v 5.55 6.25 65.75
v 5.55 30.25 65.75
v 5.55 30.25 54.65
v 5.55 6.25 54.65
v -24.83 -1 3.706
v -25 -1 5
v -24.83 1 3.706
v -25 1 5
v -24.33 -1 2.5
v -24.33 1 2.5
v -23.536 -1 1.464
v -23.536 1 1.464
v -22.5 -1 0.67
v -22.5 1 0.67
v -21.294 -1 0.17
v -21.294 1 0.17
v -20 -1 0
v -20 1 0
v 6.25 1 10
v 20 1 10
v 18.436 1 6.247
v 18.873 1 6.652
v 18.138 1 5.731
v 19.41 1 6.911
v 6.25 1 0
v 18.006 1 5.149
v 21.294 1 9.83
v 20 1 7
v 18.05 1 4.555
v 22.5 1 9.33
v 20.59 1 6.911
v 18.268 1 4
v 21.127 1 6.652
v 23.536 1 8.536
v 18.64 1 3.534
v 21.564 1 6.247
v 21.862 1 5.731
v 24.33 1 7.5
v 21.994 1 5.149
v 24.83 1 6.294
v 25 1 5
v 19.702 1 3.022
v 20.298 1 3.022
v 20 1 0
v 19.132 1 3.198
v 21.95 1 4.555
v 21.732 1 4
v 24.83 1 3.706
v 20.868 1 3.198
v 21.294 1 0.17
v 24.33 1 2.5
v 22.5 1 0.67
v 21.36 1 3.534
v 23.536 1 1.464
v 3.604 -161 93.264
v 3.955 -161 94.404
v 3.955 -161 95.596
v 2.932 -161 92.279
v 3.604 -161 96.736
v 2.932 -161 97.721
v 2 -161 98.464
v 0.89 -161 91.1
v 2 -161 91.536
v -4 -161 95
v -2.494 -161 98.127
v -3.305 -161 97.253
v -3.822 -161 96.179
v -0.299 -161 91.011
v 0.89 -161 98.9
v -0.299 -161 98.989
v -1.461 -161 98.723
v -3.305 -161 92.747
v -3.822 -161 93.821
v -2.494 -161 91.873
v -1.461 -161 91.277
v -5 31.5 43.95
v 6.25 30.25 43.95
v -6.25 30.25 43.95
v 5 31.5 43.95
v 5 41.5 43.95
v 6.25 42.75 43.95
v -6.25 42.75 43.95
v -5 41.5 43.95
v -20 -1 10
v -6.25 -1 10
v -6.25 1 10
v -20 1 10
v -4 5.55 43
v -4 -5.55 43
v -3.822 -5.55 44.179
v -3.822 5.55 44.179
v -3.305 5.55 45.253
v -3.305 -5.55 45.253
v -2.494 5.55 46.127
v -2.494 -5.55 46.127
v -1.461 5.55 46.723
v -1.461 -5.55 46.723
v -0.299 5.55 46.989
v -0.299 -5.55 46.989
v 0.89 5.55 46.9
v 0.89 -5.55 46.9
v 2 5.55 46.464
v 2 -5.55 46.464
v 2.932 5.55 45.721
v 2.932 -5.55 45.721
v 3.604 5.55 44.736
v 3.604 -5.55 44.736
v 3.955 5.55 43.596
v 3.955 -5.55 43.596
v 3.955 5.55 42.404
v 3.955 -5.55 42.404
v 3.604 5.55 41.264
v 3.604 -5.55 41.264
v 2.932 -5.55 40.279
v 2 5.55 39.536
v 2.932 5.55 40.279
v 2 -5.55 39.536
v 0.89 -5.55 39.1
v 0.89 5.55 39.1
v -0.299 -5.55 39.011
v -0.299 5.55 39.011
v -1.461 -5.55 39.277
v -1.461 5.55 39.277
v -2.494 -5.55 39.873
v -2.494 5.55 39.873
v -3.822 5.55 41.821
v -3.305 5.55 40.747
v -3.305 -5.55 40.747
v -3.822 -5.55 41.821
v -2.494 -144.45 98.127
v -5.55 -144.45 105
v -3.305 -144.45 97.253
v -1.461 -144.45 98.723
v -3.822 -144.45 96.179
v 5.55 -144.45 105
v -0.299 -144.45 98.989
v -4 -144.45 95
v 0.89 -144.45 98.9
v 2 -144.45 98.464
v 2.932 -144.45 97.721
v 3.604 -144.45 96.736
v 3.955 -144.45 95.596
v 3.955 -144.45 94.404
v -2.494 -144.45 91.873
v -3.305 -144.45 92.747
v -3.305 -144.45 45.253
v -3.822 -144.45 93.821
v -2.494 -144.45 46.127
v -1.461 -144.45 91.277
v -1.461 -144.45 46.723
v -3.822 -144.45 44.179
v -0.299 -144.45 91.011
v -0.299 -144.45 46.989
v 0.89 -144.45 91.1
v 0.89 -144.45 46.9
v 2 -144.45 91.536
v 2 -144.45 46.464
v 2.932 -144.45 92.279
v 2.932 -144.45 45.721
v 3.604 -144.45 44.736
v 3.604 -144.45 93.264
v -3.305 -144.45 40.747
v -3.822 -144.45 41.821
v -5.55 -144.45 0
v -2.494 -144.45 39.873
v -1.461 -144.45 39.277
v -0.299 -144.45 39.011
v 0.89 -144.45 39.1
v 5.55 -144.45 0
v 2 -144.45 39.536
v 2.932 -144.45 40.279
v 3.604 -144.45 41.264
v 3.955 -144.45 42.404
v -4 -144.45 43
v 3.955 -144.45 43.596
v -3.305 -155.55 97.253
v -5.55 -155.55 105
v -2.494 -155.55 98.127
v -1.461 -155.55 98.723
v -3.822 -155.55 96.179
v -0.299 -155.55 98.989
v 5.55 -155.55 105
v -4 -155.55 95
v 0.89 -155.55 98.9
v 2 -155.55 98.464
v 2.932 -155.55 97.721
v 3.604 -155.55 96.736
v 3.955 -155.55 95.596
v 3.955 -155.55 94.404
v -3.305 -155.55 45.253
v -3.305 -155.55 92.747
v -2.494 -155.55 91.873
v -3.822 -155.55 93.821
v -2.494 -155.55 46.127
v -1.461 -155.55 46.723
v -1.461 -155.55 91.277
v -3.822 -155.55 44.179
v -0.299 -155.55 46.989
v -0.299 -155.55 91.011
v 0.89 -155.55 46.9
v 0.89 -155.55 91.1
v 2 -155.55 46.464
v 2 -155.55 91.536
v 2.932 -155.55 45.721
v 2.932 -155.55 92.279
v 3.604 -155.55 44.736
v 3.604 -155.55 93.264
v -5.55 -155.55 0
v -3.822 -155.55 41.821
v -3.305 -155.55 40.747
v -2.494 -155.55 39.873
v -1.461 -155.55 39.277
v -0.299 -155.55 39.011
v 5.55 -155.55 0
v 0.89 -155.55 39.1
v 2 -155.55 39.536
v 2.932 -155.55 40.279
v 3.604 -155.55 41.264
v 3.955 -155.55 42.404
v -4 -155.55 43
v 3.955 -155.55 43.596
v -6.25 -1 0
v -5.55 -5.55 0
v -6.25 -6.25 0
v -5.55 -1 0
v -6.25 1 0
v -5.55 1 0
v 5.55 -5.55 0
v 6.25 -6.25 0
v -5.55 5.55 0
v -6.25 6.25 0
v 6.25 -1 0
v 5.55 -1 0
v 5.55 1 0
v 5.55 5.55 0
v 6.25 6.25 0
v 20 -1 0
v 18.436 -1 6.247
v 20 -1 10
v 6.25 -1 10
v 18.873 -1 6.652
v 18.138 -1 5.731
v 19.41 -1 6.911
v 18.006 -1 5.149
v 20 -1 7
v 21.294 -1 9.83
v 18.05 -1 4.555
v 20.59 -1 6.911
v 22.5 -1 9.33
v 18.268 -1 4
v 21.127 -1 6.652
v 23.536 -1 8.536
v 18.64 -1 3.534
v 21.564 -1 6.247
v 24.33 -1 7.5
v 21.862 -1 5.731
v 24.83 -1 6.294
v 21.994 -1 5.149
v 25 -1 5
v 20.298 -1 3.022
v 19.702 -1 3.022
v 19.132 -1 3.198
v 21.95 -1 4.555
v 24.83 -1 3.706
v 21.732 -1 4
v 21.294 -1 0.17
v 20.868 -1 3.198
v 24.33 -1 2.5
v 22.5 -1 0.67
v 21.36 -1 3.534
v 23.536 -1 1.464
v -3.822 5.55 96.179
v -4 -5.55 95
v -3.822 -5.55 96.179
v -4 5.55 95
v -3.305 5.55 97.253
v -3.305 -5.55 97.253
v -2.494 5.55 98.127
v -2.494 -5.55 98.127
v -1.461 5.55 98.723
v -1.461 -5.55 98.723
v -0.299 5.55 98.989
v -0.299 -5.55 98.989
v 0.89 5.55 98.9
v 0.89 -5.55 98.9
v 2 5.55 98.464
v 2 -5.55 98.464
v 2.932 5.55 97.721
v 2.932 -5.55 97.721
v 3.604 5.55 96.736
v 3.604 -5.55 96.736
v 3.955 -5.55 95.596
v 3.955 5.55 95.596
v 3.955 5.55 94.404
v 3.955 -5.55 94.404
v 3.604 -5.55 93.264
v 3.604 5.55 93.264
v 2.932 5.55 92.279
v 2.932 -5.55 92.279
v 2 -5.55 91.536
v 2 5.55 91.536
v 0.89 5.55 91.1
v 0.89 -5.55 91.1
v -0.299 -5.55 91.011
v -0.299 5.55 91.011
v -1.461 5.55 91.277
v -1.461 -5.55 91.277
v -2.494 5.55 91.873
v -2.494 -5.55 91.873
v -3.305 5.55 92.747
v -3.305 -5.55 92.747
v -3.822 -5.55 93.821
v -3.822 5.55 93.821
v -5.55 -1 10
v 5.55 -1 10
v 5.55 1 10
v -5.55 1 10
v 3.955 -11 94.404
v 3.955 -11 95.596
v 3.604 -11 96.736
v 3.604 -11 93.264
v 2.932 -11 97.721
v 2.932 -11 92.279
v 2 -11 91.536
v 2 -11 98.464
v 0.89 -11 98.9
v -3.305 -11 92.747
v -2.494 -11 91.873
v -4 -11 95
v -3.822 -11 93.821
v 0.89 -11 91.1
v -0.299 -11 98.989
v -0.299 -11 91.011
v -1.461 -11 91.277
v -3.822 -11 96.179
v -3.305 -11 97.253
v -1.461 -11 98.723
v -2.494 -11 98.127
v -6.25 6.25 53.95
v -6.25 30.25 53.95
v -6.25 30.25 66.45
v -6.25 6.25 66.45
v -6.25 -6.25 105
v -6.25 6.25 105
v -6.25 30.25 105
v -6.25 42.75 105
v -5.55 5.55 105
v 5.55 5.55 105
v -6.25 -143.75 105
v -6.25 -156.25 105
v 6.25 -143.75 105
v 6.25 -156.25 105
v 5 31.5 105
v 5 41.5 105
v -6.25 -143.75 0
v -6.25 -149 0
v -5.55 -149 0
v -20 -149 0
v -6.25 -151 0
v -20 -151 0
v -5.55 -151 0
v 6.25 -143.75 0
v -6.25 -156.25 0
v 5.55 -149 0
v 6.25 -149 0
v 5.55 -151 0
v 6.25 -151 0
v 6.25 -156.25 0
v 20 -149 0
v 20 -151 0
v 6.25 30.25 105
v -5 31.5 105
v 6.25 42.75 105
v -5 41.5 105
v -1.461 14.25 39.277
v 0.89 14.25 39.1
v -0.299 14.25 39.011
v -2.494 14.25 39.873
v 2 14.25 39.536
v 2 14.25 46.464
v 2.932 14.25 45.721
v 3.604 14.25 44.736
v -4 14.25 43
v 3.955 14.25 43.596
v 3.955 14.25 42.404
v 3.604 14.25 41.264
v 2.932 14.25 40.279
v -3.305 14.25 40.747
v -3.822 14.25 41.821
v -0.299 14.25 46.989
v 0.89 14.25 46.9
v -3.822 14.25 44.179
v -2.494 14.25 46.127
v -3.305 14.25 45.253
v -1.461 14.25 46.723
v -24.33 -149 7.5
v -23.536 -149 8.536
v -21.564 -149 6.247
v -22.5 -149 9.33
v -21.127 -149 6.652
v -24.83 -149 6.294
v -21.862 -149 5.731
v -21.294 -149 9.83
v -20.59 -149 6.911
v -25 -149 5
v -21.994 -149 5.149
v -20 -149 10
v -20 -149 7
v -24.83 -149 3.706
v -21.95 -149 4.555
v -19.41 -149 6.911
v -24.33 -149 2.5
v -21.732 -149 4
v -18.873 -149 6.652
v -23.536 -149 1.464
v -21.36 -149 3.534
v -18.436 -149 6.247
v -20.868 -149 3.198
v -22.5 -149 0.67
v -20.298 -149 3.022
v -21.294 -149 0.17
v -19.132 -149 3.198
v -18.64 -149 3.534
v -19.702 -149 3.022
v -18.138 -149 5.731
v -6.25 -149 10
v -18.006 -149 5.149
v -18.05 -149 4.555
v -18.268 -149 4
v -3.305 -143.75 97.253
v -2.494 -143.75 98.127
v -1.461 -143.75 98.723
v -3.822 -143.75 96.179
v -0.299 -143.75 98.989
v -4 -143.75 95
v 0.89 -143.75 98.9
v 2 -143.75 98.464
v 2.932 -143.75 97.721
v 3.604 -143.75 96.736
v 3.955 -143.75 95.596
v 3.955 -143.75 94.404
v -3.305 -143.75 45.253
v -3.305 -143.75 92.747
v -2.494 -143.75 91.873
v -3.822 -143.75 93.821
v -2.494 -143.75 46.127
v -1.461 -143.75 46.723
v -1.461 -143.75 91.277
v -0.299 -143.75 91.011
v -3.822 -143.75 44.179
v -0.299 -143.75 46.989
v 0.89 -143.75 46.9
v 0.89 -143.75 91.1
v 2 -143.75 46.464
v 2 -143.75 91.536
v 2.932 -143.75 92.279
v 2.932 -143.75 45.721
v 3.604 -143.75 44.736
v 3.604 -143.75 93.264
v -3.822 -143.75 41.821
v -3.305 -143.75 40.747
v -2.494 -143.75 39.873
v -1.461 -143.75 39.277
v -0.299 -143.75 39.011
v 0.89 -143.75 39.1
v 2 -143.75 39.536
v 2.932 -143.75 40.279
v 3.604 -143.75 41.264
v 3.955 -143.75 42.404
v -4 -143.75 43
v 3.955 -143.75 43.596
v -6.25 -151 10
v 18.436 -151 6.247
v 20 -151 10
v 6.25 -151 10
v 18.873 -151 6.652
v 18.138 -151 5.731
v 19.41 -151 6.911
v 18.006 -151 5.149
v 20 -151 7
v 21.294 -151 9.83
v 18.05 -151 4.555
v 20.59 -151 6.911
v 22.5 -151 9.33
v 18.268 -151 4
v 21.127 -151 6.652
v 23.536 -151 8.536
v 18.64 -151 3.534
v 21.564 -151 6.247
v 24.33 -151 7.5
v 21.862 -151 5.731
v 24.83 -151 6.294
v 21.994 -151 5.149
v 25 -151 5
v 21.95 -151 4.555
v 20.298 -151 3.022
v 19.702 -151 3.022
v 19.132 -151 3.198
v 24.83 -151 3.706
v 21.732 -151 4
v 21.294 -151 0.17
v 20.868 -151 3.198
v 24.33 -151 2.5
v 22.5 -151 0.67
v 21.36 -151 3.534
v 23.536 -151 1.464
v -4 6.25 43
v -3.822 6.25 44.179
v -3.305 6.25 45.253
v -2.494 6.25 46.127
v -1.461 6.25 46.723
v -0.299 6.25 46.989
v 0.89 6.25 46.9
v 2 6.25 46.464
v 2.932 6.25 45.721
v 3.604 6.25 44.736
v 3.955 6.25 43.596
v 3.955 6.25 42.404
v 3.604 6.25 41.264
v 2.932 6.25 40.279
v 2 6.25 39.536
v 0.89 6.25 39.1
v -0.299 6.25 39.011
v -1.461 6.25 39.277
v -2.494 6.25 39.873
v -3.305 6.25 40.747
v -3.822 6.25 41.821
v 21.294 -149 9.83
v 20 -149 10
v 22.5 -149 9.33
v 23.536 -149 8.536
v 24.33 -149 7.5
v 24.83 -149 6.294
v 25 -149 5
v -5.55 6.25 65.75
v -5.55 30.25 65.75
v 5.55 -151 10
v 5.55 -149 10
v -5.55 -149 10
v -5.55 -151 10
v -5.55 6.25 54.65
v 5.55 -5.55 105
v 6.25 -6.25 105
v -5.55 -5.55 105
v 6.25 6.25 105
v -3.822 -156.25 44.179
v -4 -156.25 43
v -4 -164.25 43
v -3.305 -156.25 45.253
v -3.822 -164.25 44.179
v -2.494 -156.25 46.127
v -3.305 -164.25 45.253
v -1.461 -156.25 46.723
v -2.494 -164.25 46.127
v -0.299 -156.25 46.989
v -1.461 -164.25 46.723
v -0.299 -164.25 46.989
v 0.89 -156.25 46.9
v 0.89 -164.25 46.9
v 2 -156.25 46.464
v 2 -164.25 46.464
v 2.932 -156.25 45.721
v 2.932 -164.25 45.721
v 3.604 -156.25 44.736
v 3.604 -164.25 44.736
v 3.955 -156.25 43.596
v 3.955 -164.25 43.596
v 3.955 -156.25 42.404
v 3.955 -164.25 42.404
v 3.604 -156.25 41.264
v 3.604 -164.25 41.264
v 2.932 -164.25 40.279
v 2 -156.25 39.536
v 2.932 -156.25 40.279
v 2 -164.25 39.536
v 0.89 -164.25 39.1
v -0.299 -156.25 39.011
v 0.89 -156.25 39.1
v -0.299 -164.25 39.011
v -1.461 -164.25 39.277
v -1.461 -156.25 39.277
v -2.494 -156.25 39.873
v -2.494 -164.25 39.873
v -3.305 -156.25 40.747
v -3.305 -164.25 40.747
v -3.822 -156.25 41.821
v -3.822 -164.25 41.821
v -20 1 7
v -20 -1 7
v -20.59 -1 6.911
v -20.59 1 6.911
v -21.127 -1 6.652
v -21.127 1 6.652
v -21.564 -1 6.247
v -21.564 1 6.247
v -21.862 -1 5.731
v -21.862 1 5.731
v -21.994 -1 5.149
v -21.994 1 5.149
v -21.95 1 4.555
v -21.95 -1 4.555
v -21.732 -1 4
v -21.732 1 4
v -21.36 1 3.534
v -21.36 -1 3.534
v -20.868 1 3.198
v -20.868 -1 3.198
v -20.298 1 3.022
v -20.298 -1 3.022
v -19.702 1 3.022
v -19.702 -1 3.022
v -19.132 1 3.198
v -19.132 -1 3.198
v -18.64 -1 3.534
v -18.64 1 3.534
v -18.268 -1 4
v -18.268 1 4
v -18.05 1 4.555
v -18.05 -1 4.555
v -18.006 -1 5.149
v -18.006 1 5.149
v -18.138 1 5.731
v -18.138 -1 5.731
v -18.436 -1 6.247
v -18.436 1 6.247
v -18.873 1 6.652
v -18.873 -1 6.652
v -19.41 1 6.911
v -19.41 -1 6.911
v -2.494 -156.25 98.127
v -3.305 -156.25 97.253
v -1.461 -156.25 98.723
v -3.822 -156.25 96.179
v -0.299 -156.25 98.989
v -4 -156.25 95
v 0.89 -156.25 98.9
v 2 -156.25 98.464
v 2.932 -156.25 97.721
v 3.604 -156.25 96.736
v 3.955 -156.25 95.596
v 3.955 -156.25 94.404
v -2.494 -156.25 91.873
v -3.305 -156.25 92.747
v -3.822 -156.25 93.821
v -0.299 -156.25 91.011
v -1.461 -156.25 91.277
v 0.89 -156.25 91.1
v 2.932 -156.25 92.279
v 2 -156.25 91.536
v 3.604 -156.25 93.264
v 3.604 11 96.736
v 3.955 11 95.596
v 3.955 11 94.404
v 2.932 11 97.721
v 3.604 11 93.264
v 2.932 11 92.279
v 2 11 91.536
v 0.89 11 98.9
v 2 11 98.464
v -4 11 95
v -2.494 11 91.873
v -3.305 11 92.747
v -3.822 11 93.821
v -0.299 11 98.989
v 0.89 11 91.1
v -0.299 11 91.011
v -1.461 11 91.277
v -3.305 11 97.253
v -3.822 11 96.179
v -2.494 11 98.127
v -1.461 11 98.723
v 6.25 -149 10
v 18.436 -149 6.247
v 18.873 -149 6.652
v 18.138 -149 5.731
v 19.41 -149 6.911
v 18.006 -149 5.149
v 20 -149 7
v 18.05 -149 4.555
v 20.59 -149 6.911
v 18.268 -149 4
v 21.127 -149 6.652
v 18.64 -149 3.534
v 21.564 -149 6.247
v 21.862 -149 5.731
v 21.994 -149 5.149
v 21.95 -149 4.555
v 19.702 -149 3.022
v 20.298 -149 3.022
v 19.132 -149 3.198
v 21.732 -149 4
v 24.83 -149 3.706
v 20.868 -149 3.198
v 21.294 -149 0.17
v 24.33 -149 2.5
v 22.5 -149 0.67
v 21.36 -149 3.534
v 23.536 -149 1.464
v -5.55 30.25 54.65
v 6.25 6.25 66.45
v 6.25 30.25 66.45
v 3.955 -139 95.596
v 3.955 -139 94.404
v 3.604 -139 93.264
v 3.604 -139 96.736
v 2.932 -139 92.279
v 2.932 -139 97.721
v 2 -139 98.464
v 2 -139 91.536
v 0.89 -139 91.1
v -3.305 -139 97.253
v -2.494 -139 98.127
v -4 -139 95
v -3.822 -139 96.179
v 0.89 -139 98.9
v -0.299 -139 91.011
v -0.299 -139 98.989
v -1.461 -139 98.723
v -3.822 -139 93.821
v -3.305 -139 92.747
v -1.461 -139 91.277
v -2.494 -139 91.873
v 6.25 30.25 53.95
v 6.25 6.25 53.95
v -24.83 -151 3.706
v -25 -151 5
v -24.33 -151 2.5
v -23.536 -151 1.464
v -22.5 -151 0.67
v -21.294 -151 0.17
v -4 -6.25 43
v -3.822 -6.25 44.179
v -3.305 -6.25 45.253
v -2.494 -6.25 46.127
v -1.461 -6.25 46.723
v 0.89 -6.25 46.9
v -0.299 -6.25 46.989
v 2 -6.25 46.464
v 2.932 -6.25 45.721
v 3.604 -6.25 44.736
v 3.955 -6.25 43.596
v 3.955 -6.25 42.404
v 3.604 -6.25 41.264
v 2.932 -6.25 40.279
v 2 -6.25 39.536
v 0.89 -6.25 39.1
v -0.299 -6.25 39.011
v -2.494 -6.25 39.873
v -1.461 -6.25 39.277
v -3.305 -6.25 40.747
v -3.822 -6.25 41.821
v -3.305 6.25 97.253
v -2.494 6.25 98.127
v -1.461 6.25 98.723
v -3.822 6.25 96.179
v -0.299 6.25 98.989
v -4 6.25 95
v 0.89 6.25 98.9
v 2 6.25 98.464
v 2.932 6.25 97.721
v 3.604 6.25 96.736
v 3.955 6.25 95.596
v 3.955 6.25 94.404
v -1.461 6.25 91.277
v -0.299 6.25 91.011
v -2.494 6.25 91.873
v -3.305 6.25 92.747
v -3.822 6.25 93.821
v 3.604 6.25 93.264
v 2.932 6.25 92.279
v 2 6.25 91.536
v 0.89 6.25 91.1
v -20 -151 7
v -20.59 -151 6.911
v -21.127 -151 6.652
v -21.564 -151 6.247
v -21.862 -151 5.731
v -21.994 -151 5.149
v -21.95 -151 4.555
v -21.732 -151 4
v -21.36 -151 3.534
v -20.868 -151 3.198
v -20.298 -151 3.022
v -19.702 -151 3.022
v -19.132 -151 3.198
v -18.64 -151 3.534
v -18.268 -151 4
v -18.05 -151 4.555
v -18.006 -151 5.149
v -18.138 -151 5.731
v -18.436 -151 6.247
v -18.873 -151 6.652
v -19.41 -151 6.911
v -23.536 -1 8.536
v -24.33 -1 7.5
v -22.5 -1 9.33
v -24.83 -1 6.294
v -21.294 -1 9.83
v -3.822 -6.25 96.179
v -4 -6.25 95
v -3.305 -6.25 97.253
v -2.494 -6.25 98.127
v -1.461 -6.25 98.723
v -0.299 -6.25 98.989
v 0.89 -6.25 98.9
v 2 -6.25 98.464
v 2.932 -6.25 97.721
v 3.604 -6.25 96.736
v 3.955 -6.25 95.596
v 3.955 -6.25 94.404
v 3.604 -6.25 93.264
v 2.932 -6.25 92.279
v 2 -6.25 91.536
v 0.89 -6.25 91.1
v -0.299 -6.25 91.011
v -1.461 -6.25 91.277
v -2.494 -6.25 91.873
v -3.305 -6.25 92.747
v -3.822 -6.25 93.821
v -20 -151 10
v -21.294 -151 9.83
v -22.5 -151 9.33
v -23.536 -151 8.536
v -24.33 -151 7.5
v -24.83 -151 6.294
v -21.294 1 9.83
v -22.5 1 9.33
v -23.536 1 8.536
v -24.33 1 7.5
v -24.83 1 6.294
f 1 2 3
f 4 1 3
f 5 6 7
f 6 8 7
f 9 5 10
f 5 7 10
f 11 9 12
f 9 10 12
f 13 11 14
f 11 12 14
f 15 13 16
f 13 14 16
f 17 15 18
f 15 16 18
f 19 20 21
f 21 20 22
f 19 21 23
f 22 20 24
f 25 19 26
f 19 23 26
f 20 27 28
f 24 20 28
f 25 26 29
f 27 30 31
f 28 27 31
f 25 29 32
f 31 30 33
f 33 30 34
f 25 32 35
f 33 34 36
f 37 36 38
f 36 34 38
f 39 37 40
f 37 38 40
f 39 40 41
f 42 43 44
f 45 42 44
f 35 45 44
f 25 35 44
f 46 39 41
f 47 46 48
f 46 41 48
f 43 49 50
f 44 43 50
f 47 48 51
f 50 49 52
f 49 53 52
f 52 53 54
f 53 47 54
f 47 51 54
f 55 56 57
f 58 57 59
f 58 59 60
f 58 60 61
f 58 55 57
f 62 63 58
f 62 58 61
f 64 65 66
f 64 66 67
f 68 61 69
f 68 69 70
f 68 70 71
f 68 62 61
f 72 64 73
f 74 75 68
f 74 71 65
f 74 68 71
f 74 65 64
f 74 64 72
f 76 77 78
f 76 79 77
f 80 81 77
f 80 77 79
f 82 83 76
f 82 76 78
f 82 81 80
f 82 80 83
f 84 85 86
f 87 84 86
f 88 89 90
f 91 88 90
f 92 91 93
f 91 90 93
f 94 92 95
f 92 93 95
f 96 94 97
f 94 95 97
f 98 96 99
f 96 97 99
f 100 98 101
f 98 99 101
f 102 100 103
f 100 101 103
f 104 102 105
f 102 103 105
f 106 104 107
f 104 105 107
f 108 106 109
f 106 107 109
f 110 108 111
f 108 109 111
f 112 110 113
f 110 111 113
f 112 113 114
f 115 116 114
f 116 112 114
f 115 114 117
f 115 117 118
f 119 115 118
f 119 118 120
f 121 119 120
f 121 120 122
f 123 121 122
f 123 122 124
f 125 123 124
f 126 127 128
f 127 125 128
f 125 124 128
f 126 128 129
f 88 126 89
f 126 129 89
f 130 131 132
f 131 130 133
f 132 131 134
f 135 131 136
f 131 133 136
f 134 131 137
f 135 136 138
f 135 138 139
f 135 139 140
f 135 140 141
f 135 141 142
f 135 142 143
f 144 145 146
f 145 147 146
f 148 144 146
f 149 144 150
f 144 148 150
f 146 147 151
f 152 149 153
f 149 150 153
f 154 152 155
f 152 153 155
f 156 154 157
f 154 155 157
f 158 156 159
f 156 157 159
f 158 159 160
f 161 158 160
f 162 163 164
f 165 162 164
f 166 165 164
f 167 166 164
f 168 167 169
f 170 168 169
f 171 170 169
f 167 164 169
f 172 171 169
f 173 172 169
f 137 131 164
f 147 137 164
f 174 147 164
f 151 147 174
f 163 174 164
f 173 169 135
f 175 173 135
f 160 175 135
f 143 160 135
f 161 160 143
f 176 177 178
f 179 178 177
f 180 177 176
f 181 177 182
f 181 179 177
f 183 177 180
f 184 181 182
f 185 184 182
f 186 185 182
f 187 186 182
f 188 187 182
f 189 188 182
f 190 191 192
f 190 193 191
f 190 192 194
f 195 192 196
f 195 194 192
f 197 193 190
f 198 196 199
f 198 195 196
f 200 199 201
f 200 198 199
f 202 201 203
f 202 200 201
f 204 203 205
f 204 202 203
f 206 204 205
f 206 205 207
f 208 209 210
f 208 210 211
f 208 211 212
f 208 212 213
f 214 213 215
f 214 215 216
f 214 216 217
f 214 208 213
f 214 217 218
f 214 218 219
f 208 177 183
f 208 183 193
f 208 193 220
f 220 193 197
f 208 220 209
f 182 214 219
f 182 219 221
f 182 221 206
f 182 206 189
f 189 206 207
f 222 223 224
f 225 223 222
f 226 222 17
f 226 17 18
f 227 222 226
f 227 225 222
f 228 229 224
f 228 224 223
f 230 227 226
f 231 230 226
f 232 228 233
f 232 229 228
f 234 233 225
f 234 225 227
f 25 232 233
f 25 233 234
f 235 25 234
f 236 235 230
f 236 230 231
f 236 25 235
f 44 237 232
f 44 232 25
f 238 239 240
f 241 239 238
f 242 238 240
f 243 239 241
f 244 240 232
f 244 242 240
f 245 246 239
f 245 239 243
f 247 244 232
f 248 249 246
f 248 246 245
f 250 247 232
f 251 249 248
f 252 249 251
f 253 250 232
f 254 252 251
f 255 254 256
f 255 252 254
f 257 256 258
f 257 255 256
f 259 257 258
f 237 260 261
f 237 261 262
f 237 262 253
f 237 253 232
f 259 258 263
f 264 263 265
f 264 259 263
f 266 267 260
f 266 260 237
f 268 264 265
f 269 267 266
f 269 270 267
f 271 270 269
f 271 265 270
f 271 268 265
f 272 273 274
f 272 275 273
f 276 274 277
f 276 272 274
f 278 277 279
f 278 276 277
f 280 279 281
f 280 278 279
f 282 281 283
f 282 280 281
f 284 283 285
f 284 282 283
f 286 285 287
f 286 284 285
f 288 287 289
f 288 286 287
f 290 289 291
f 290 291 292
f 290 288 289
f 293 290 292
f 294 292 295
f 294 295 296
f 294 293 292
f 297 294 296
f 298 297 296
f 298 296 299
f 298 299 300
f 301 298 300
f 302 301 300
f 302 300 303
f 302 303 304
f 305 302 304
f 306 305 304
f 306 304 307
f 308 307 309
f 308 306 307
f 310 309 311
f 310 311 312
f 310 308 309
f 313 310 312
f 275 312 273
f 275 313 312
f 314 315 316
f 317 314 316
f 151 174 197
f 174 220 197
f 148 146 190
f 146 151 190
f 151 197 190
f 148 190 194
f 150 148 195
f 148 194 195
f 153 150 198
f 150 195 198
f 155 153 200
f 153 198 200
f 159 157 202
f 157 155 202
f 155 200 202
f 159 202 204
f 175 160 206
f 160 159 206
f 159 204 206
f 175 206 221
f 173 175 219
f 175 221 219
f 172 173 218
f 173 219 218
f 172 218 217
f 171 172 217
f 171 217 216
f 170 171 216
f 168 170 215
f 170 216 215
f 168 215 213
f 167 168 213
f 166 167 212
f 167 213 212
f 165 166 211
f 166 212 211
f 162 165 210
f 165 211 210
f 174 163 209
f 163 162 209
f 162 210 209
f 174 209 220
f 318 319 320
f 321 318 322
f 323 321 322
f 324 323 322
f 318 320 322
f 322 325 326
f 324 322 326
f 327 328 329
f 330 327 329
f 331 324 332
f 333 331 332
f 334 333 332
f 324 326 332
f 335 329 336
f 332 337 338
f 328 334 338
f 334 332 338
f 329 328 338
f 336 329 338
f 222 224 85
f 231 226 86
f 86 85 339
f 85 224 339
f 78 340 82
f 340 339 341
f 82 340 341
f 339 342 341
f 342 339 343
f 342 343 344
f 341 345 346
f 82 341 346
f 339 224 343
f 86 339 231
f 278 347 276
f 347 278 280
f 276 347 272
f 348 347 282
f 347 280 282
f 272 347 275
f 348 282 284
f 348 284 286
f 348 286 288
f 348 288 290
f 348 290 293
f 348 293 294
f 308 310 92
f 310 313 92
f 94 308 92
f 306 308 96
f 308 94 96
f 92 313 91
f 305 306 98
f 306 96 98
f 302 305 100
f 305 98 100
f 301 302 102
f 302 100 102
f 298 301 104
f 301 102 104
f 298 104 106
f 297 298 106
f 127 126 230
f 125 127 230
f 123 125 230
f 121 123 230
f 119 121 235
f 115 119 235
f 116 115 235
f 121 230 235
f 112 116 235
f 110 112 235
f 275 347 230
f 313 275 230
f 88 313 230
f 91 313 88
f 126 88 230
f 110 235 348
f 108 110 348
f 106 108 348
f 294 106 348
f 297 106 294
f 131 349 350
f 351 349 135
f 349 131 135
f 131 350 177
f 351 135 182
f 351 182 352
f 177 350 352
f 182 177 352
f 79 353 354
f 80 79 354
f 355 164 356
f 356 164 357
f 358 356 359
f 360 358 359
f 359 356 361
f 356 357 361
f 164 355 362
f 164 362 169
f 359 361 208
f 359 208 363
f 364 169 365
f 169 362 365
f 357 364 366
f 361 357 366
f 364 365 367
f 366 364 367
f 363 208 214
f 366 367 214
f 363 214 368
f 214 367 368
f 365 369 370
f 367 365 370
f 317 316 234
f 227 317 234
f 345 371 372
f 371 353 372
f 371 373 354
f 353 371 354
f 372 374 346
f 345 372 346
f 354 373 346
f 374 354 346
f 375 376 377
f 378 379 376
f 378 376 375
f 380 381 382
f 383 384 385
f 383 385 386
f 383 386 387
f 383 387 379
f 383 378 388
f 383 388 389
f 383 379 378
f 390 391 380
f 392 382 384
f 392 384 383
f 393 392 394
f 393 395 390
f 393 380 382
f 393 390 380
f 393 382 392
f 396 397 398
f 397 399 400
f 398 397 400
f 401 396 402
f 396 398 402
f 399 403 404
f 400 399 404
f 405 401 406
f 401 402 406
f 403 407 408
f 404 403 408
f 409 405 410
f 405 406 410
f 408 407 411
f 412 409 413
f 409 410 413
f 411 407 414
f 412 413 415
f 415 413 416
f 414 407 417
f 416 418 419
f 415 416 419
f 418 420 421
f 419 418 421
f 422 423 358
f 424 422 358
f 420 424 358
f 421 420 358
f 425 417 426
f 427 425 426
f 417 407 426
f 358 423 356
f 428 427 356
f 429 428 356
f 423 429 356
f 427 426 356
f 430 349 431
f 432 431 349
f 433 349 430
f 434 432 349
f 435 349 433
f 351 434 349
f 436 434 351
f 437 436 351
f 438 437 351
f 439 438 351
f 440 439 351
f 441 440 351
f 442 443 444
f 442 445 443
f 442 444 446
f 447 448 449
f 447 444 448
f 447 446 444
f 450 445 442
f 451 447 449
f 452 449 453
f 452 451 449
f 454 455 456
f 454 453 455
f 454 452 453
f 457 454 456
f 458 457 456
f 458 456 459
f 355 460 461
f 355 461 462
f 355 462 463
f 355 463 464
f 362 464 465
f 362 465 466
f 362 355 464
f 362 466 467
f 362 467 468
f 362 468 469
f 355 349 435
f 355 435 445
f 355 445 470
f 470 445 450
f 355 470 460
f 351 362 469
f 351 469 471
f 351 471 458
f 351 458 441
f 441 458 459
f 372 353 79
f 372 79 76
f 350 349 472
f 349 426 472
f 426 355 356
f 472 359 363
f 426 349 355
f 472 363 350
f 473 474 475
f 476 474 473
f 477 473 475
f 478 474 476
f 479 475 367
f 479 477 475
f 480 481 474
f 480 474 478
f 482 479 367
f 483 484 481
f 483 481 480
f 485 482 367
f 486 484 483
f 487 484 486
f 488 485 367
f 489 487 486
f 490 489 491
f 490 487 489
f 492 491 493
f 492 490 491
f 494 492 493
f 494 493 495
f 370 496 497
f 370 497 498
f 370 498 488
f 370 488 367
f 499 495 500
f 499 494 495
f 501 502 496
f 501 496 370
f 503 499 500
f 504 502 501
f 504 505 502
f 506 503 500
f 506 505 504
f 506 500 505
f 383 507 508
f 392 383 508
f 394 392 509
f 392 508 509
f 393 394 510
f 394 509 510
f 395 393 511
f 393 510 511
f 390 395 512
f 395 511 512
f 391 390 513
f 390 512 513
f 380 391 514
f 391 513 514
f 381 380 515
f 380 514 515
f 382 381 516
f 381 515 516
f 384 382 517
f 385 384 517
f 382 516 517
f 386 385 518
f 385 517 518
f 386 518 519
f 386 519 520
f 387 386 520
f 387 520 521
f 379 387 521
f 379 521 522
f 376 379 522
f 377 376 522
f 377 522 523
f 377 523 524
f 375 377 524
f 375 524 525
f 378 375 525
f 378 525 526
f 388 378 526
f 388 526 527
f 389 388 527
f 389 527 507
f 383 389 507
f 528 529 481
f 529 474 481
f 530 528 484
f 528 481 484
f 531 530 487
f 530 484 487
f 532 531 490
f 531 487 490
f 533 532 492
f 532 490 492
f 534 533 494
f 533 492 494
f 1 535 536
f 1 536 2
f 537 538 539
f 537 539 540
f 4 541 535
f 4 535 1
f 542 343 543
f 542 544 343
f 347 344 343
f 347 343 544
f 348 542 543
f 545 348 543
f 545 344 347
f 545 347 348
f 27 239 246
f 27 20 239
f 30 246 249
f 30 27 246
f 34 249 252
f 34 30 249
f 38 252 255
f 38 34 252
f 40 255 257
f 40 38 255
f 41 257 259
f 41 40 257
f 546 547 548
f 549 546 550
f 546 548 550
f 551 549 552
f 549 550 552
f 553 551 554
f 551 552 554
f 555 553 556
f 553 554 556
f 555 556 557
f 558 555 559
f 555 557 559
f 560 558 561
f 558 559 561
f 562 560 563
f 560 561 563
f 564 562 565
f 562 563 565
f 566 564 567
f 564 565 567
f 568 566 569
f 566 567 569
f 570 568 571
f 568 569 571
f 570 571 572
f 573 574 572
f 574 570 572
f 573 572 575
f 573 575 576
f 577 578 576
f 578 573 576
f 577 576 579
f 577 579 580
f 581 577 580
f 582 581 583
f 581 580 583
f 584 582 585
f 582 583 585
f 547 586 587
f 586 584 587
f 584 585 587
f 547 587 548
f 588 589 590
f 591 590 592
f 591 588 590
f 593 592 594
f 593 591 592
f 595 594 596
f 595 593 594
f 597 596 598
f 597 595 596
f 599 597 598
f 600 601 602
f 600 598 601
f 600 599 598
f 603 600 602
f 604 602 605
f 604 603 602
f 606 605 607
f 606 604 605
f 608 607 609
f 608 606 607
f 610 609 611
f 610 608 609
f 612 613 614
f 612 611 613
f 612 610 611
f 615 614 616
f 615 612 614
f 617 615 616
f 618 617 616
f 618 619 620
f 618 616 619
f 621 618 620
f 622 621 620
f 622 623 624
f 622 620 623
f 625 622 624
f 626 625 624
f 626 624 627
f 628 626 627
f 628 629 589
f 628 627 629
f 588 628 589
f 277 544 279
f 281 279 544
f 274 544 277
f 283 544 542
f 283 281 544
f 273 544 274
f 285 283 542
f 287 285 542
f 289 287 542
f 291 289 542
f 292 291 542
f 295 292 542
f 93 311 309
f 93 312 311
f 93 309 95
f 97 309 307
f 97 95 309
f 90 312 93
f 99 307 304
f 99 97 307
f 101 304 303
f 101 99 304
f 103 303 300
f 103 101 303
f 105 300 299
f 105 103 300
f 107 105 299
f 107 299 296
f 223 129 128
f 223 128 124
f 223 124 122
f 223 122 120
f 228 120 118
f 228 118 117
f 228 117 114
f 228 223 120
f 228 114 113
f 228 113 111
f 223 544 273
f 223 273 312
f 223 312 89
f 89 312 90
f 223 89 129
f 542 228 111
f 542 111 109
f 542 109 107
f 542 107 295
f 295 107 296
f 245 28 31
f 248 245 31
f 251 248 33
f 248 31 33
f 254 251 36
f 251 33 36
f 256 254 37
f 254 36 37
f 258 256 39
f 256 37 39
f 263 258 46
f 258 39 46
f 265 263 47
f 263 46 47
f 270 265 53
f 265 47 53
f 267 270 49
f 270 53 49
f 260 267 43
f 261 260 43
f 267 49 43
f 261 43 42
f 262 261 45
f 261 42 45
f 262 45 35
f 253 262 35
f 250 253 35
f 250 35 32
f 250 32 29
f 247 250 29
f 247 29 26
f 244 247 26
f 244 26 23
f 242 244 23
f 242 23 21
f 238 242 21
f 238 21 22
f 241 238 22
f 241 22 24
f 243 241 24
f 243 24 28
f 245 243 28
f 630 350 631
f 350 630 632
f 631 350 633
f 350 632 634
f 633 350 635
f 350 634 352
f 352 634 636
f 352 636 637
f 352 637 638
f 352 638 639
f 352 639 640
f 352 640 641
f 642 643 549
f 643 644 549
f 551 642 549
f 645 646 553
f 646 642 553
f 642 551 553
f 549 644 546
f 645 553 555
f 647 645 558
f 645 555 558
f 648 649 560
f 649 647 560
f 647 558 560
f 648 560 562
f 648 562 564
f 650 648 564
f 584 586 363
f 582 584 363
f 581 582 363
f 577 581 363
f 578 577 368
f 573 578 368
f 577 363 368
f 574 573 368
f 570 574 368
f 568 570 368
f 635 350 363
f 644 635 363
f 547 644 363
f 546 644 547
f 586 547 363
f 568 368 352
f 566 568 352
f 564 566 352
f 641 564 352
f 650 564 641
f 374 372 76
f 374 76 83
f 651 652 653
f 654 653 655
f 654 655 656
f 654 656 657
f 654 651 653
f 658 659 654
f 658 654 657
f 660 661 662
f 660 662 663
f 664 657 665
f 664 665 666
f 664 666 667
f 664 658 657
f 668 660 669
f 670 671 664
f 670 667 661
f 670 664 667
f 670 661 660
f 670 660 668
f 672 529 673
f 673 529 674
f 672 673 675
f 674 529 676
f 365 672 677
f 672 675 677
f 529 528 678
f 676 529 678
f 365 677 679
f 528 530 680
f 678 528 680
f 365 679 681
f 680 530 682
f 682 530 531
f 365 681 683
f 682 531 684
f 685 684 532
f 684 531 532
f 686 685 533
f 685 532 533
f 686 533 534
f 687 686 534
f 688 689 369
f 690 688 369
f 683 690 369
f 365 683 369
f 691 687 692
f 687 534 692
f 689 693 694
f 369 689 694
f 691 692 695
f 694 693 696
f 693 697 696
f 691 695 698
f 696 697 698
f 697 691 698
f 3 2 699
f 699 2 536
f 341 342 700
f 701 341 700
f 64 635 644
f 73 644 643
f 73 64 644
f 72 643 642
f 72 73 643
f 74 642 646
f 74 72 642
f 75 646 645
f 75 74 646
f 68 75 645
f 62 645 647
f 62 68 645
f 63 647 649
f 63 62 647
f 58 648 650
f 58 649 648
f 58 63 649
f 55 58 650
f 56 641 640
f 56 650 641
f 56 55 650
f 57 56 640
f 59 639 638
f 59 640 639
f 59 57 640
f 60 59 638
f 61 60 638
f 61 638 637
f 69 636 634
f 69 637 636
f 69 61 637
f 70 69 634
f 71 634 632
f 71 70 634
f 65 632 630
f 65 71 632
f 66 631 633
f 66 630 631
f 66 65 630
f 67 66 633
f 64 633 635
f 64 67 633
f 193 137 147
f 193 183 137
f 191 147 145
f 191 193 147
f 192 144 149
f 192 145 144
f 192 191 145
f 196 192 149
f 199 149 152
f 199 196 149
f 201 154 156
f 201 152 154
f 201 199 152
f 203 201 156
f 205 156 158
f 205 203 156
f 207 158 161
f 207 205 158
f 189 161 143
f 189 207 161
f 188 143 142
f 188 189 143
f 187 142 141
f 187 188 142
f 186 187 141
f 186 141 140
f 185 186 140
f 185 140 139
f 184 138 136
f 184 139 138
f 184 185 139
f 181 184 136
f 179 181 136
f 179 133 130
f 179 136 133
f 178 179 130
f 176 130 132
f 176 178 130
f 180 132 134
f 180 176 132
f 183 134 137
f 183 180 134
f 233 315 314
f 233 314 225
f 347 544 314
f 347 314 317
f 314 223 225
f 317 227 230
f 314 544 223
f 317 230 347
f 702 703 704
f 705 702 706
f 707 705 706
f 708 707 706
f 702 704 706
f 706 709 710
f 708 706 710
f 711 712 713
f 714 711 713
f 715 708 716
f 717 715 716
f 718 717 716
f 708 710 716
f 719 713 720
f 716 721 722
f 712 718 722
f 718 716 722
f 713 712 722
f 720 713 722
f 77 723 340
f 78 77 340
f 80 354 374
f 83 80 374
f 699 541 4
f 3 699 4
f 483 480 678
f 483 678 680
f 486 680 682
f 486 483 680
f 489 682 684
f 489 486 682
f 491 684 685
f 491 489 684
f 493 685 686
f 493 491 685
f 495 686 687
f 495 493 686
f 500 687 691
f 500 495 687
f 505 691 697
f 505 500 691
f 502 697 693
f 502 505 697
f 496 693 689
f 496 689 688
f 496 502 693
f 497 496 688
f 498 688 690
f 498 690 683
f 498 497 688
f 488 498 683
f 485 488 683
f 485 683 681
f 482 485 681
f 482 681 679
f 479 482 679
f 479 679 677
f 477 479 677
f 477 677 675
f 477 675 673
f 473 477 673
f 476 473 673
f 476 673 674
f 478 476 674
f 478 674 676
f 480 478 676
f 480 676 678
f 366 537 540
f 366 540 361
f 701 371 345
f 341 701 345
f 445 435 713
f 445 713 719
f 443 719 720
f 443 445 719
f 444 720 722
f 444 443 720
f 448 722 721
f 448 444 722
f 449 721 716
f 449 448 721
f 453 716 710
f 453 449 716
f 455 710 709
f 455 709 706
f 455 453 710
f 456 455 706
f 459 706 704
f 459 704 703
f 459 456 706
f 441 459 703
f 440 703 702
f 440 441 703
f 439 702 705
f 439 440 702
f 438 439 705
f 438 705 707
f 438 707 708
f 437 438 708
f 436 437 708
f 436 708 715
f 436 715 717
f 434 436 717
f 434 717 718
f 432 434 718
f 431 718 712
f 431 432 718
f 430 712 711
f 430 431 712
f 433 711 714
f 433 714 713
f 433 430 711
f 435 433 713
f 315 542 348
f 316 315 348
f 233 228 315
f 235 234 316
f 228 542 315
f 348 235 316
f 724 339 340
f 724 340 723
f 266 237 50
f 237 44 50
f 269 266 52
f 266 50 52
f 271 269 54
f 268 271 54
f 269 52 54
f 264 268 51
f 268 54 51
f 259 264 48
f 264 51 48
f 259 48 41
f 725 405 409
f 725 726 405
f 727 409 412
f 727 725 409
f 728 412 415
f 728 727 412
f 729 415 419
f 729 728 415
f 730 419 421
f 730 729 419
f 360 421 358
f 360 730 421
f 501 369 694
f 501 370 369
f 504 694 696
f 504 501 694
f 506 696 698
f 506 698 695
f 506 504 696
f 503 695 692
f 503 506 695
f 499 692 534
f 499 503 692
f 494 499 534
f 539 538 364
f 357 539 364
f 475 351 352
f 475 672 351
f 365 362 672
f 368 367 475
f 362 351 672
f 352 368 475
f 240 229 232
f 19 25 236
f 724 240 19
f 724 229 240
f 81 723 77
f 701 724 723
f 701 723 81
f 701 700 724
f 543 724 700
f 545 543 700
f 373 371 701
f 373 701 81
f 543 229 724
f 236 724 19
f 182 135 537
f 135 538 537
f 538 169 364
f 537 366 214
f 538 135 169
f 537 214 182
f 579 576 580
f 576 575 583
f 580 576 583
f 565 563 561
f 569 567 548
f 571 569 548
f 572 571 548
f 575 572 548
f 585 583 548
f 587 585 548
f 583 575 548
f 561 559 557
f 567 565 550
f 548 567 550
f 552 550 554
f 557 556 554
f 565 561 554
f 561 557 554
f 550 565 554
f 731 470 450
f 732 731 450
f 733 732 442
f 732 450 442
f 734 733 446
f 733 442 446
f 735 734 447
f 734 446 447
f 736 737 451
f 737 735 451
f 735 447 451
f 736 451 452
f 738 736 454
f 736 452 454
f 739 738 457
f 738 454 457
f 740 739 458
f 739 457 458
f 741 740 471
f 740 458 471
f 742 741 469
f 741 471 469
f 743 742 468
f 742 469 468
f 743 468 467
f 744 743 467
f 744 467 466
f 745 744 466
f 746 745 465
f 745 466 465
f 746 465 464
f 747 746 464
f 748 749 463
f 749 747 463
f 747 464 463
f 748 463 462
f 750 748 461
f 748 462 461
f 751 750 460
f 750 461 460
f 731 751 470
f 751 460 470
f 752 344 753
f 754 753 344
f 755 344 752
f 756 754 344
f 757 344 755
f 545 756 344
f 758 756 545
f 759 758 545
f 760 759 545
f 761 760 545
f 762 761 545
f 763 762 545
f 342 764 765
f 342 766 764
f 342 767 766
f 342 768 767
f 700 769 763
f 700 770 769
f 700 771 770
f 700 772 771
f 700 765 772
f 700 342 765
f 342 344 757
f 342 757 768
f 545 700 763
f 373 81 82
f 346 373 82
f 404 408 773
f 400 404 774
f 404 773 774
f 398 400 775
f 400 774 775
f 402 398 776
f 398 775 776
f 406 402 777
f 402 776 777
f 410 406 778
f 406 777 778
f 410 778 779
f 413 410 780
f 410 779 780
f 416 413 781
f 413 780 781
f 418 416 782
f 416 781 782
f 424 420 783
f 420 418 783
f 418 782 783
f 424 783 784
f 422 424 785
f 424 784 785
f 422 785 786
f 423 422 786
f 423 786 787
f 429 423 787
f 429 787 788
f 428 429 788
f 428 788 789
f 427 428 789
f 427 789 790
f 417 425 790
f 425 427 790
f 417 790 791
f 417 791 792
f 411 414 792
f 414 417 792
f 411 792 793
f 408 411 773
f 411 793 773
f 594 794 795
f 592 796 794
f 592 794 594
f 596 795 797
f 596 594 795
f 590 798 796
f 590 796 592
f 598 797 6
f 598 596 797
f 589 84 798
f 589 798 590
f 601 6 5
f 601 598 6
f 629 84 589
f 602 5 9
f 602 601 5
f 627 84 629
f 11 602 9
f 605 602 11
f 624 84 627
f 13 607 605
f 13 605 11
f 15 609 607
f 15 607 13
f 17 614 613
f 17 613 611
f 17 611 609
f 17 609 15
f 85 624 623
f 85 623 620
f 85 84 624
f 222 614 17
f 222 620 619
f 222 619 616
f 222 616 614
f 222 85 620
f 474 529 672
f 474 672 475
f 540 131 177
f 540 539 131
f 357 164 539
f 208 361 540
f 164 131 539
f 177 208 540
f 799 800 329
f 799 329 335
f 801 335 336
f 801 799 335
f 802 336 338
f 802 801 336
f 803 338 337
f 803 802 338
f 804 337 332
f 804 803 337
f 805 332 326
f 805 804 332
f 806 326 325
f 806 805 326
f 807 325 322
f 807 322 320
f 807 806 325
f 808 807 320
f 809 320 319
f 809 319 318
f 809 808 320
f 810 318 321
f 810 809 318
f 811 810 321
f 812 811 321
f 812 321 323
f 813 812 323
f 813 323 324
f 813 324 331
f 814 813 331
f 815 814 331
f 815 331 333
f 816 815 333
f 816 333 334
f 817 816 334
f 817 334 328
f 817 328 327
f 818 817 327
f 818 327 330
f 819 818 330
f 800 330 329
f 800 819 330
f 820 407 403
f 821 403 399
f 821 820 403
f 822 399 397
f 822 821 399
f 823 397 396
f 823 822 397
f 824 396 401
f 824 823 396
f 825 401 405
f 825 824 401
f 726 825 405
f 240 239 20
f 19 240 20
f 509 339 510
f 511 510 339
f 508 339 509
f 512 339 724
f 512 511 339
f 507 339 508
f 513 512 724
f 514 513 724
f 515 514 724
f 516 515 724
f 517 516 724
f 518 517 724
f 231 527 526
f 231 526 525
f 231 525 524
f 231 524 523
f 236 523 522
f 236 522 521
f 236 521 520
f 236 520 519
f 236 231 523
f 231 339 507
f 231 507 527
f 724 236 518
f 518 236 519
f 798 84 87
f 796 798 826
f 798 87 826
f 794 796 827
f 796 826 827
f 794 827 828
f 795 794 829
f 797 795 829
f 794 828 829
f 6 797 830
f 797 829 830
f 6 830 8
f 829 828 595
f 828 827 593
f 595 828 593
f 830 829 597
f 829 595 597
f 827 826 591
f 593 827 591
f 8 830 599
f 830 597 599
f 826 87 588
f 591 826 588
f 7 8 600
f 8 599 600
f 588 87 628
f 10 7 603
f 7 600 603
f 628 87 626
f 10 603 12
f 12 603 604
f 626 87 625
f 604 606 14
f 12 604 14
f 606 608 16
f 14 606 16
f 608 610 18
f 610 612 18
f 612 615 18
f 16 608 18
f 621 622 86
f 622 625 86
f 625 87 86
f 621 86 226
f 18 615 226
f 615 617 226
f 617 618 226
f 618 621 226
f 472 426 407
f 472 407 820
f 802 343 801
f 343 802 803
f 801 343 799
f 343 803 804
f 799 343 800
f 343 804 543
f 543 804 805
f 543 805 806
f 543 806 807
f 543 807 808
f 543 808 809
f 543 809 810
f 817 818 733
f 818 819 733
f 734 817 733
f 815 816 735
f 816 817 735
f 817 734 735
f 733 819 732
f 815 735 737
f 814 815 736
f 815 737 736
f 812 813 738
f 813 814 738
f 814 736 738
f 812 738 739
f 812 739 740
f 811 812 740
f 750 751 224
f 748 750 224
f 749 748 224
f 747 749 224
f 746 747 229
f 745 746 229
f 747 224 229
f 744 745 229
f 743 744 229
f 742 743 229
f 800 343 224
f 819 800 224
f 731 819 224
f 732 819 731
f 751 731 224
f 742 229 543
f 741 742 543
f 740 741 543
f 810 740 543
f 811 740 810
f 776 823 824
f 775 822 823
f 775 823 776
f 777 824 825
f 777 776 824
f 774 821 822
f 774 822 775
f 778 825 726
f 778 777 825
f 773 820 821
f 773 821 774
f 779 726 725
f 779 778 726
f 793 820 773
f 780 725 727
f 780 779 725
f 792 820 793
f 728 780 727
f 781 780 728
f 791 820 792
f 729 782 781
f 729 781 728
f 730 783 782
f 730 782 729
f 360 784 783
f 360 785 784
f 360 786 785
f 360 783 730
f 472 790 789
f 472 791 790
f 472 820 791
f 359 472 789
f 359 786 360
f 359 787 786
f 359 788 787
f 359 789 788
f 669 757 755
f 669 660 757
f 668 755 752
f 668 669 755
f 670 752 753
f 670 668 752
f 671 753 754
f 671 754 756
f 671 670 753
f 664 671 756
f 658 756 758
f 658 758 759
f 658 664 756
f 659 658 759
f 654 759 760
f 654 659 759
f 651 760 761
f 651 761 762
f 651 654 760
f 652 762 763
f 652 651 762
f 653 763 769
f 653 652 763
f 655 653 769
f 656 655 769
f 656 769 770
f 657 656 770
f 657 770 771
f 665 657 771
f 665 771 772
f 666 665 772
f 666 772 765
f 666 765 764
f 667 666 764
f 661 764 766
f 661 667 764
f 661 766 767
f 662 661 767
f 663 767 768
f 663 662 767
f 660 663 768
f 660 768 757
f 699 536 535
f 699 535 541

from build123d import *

# Parameters (mm, degrees)
SKETCH2_W                = 12.5
SKETCH2_H                = 12.5
SKETCH2_W_2              = 11.1
SKETCH2_H_2              = 11.1
BOSS_EXTRUDE1_DEPTH      = 105
SKETCH3_R                = 4
CUT_EXTRUDE1_DEPTH       = 105
SKETCH4_W                = 10
SKETCH4_H                = 2
BOSS_EXTRUDE2_DEPTH      = 25
FILLET1_R                = 5
SKETCH5_R                = 2
CUT_EXTRUDE2_DEPTH       = 40
BOSS_EXTRUDE3_START      = -82.5
SKETCH6_R                = 4
BOSS_EXTRUDE3_DEPTH      = 90.5
SKETCH8_W                = 12.5
SKETCH8_H                = 12.5
SKETCH8_W_2              = 11.1
SKETCH8_H_2              = 11.1
BOSS_EXTRUDE4_DEPTH      = 24
BOSS_EXTRUDE5_DEPTH      = 10
BOSS_EXTRUDE5_DEPTH_BACK = 51.049582
SKETCH9_W                = 12.5
SKETCH9_H                = 12.5
SKETCH9_W_2              = 10
SKETCH9_H_2              = 10
SKETCH11_R               = 4
BOSS_EXTRUDE6_DEPTH      = 11
SKETCH12_R               = 4
BOSS_EXTRUDE7_DEPTH      = 11


with BuildPart() as part:
    # Sketch2 → Boss-Extrude1 (new body)
    with BuildSketch(Plane.XY):
        Rectangle(SKETCH2_W, SKETCH2_H)
        Rectangle(SKETCH2_W_2, SKETCH2_H_2, mode=Mode.SUBTRACT)
    extrude(amount=BOSS_EXTRUDE1_DEPTH)

    # Sketch3 → Cut-Extrude1 (cut)
    with BuildSketch(Plane(origin=(0, 6.25, 0), x_dir=(1, 0, 0), z_dir=(0, 1, 0))):
        with Locations(Location((0, -95, 0), (0, 0, 180))):
            Circle(SKETCH3_R)
    extrude(amount=-CUT_EXTRUDE1_DEPTH, mode=Mode.SUBTRACT)

    # Sketch4 → Boss-Extrude2 (add, symmetric)
    with BuildSketch(Plane(origin=(0, 0, 0), x_dir=(0, 0, -1), z_dir=(1, 0, 0))):
        with Locations((-5, 0)):
            Rectangle(SKETCH4_W, SKETCH4_H)
    extrude(amount=BOSS_EXTRUDE2_DEPTH, both=True)

    # Fillet1
    fillet1_edges = [part.edges().sort_by_distance(p)[0] for p in [
        (-25, 0, 10),
        (-25, 0, 0),
        (25, 0, 10),
        (25, 0, 0),
    ]]
    fillet(fillet1_edges, radius=FILLET1_R - 0.0001)  # a hair under: the kernel refuses the full size

    # Sketch5 → Cut-Extrude2 (cut)
    with BuildSketch(Plane(origin=(0, 1, 0), x_dir=(1, 0, 0), z_dir=(0, 1, 0))):
        with Locations(Location((20, -5, 0), (0, 0, 270))):
            Circle(SKETCH5_R)
    cut_extrude2 = extrude(amount=-CUT_EXTRUDE2_DEPTH, mode=Mode.SUBTRACT)

    # Mirror1: Cut-Extrude2 across plane
    add(cut_extrude2.mirror(Plane(origin=(0, 0, 0), x_dir=(0, 0, 1), z_dir=(1, 0, 0))), mode=Mode.SUBTRACT)


with BuildPart() as body_2:
    # Mirror3: mirrored copy
    add(part.part.mirror(Plane(origin=(0, -75, 0), x_dir=(0, 0, 1), z_dir=(0, -1, 0))))



with BuildPart() as part_1:
    add(part.part)

    # Sketch6 → Boss-Extrude3 (add)
    with BuildSketch(Plane(origin=(0, 6.25, 0), x_dir=(1, 0, 0), z_dir=(0, 1, 0)).offset(BOSS_EXTRUDE3_START)):
        with Locations(Location((0, -43, 0), (0, 0, 180))):
            Circle(SKETCH6_R)
    boss_extrude3 = extrude(amount=BOSS_EXTRUDE3_DEPTH)

    # Mirror4: Boss-Extrude3 across plane
    add(boss_extrude3.mirror(Plane(origin=(0, -75, 0), x_dir=(0, 0, 1), z_dir=(0, -1, 0))))

    # Sketch8 → Boss-Extrude4 (add)
    with BuildSketch(Plane(origin=(0, 6.25, 0), x_dir=(1, 0, 0), z_dir=(0, 1, 0))):
        with Locations((0, -60.200417772)):
            Rectangle(SKETCH8_W, SKETCH8_H)
        with Locations((0, -60.200417772)):
            Rectangle(SKETCH8_W_2, SKETCH8_H_2, mode=Mode.SUBTRACT)
    extrude(amount=BOSS_EXTRUDE4_DEPTH)

    # Sketch9 → Boss-Extrude5 (add, two sides: drawn at the far end of the back side and taken through both)
    with BuildSketch(Plane(origin=(0, 0, 53.950417772), x_dir=(-1, 0, 0), z_dir=(0, 0, -1)).offset(-BOSS_EXTRUDE5_DEPTH_BACK)):
        with Locations((0, 36.5)):
            Rectangle(SKETCH9_W, SKETCH9_H)
        with Locations((0, 36.5)):
            Rectangle(SKETCH9_W_2, SKETCH9_H_2, mode=Mode.SUBTRACT)
    extrude(amount=BOSS_EXTRUDE5_DEPTH + BOSS_EXTRUDE5_DEPTH_BACK)

    # Sketch11 → Boss-Extrude6 (add, symmetric)
    with BuildSketch(Plane(origin=(0, 0, 0), x_dir=(1, 0, 0), z_dir=(0, 1, 0))):
        with Locations(Location((0, -95, 0), (0, 0, 180))):
            Circle(SKETCH11_R)
    extrude(amount=BOSS_EXTRUDE6_DEPTH, both=True)


with BuildPart() as body_2_1:
    add(body_2.part)

    add(part_1.part)  # Boss-Extrude7 merges part
    # Sketch12 → Boss-Extrude7 (add, symmetric)
    with BuildSketch(Plane(origin=(0, -150, 0), x_dir=(-1, 0, 0), z_dir=(0, -1, 0))):
        with Locations((0, -95)):
            Circle(SKETCH12_R)
    extrude(amount=BOSS_EXTRUDE7_DEPTH, both=True)


solid = body_2_1.part
